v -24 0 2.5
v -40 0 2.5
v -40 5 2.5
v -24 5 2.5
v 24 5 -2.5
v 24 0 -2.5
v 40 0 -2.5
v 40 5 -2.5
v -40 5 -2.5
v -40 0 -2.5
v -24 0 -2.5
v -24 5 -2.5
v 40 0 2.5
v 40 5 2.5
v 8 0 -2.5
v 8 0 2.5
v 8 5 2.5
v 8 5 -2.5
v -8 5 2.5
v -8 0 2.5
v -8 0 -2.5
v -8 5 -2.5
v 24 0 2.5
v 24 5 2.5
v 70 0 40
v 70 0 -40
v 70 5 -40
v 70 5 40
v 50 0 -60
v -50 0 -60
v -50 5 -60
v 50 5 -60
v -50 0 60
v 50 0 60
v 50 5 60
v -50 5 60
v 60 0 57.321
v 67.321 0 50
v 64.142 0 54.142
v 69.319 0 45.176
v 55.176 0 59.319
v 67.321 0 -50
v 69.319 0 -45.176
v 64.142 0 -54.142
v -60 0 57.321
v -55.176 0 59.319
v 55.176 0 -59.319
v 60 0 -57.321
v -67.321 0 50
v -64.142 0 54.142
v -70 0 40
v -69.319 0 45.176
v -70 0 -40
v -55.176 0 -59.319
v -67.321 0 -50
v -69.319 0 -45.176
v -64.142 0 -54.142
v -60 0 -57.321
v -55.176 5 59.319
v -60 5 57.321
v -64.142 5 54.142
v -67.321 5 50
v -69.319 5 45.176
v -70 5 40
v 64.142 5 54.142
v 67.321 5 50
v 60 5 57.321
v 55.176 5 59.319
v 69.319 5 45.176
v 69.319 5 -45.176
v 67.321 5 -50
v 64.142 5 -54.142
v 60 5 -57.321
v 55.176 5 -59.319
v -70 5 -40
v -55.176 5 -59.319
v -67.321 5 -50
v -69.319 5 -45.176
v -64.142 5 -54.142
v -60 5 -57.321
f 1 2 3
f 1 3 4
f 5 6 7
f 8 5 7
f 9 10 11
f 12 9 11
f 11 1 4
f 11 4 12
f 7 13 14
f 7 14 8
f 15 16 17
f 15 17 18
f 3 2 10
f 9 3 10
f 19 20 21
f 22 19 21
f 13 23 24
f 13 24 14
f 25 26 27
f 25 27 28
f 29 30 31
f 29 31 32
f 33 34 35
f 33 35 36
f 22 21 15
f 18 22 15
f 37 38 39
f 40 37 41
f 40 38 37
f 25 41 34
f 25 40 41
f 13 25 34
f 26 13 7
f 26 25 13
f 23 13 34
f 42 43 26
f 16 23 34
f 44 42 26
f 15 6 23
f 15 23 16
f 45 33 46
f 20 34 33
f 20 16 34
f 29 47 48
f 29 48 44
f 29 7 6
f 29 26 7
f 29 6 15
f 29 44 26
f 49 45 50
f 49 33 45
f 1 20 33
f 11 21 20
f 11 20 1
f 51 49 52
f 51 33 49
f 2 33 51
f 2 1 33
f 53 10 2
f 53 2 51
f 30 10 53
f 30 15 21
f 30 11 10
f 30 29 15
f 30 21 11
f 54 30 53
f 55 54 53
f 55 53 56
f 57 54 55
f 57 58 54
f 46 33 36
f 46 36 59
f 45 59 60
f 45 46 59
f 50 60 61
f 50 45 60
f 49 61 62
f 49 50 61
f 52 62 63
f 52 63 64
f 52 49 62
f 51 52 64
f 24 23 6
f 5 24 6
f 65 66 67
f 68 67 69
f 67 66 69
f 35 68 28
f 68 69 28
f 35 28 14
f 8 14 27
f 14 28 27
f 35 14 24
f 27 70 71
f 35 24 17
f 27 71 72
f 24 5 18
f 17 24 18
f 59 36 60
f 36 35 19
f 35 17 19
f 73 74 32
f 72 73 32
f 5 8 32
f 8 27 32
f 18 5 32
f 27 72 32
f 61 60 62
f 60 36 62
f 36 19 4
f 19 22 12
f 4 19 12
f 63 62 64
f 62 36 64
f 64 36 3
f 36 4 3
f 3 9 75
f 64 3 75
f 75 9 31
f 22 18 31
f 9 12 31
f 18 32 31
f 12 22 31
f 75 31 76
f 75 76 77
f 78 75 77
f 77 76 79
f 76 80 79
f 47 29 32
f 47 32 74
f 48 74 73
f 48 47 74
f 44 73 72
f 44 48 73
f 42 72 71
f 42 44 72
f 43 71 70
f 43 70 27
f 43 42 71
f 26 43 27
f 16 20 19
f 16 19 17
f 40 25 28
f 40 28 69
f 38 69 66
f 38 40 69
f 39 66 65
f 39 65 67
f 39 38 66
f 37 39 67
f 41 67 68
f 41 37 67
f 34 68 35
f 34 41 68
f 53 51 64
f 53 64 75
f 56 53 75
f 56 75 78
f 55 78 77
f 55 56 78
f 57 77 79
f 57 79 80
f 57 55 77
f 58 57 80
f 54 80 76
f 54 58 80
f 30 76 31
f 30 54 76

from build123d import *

# Parameters (mm, degrees)
SKETCH1_W           = 16
SKETCH1_H           = 5
BOSS_EXTRUDE1_DEPTH = 5


with BuildPart() as part:
    # Sketch1 → Boss-Extrude1 (new body)
    with BuildSketch(Plane(origin=(0, 0, 0), x_dir=(1, 0, 0), z_dir=(0, 1, 0))):
        with BuildLine():
            Line((-50, 60), (50, 60))
            ThreePointArc((50, 60), (64.142135624, 54.142135624), (70, 40))
            Line((70, 40), (70, -40))
            ThreePointArc((70, -40), (64.142135624, -54.142135624), (50, -60))
            Line((50, -60), (-50, -60))
            ThreePointArc((-50, -60), (-64.142135624, -54.142135624), (-70, -40))
            Line((-70, -40), (-70, 40))
            ThreePointArc((-70, 40), (-64.142135624, 54.142135624), (-50, 60))
        make_face()
        Rectangle(SKETCH1_W, SKETCH1_H, mode=Mode.SUBTRACT)
        with Locations((-32, 0)):
            Rectangle(SKETCH1_W, SKETCH1_H, mode=Mode.SUBTRACT)
        with Locations((32, 0)):
            Rectangle(SKETCH1_W, SKETCH1_H, mode=Mode.SUBTRACT)
    extrude(amount=BOSS_EXTRUDE1_DEPTH)


solid = part.part
